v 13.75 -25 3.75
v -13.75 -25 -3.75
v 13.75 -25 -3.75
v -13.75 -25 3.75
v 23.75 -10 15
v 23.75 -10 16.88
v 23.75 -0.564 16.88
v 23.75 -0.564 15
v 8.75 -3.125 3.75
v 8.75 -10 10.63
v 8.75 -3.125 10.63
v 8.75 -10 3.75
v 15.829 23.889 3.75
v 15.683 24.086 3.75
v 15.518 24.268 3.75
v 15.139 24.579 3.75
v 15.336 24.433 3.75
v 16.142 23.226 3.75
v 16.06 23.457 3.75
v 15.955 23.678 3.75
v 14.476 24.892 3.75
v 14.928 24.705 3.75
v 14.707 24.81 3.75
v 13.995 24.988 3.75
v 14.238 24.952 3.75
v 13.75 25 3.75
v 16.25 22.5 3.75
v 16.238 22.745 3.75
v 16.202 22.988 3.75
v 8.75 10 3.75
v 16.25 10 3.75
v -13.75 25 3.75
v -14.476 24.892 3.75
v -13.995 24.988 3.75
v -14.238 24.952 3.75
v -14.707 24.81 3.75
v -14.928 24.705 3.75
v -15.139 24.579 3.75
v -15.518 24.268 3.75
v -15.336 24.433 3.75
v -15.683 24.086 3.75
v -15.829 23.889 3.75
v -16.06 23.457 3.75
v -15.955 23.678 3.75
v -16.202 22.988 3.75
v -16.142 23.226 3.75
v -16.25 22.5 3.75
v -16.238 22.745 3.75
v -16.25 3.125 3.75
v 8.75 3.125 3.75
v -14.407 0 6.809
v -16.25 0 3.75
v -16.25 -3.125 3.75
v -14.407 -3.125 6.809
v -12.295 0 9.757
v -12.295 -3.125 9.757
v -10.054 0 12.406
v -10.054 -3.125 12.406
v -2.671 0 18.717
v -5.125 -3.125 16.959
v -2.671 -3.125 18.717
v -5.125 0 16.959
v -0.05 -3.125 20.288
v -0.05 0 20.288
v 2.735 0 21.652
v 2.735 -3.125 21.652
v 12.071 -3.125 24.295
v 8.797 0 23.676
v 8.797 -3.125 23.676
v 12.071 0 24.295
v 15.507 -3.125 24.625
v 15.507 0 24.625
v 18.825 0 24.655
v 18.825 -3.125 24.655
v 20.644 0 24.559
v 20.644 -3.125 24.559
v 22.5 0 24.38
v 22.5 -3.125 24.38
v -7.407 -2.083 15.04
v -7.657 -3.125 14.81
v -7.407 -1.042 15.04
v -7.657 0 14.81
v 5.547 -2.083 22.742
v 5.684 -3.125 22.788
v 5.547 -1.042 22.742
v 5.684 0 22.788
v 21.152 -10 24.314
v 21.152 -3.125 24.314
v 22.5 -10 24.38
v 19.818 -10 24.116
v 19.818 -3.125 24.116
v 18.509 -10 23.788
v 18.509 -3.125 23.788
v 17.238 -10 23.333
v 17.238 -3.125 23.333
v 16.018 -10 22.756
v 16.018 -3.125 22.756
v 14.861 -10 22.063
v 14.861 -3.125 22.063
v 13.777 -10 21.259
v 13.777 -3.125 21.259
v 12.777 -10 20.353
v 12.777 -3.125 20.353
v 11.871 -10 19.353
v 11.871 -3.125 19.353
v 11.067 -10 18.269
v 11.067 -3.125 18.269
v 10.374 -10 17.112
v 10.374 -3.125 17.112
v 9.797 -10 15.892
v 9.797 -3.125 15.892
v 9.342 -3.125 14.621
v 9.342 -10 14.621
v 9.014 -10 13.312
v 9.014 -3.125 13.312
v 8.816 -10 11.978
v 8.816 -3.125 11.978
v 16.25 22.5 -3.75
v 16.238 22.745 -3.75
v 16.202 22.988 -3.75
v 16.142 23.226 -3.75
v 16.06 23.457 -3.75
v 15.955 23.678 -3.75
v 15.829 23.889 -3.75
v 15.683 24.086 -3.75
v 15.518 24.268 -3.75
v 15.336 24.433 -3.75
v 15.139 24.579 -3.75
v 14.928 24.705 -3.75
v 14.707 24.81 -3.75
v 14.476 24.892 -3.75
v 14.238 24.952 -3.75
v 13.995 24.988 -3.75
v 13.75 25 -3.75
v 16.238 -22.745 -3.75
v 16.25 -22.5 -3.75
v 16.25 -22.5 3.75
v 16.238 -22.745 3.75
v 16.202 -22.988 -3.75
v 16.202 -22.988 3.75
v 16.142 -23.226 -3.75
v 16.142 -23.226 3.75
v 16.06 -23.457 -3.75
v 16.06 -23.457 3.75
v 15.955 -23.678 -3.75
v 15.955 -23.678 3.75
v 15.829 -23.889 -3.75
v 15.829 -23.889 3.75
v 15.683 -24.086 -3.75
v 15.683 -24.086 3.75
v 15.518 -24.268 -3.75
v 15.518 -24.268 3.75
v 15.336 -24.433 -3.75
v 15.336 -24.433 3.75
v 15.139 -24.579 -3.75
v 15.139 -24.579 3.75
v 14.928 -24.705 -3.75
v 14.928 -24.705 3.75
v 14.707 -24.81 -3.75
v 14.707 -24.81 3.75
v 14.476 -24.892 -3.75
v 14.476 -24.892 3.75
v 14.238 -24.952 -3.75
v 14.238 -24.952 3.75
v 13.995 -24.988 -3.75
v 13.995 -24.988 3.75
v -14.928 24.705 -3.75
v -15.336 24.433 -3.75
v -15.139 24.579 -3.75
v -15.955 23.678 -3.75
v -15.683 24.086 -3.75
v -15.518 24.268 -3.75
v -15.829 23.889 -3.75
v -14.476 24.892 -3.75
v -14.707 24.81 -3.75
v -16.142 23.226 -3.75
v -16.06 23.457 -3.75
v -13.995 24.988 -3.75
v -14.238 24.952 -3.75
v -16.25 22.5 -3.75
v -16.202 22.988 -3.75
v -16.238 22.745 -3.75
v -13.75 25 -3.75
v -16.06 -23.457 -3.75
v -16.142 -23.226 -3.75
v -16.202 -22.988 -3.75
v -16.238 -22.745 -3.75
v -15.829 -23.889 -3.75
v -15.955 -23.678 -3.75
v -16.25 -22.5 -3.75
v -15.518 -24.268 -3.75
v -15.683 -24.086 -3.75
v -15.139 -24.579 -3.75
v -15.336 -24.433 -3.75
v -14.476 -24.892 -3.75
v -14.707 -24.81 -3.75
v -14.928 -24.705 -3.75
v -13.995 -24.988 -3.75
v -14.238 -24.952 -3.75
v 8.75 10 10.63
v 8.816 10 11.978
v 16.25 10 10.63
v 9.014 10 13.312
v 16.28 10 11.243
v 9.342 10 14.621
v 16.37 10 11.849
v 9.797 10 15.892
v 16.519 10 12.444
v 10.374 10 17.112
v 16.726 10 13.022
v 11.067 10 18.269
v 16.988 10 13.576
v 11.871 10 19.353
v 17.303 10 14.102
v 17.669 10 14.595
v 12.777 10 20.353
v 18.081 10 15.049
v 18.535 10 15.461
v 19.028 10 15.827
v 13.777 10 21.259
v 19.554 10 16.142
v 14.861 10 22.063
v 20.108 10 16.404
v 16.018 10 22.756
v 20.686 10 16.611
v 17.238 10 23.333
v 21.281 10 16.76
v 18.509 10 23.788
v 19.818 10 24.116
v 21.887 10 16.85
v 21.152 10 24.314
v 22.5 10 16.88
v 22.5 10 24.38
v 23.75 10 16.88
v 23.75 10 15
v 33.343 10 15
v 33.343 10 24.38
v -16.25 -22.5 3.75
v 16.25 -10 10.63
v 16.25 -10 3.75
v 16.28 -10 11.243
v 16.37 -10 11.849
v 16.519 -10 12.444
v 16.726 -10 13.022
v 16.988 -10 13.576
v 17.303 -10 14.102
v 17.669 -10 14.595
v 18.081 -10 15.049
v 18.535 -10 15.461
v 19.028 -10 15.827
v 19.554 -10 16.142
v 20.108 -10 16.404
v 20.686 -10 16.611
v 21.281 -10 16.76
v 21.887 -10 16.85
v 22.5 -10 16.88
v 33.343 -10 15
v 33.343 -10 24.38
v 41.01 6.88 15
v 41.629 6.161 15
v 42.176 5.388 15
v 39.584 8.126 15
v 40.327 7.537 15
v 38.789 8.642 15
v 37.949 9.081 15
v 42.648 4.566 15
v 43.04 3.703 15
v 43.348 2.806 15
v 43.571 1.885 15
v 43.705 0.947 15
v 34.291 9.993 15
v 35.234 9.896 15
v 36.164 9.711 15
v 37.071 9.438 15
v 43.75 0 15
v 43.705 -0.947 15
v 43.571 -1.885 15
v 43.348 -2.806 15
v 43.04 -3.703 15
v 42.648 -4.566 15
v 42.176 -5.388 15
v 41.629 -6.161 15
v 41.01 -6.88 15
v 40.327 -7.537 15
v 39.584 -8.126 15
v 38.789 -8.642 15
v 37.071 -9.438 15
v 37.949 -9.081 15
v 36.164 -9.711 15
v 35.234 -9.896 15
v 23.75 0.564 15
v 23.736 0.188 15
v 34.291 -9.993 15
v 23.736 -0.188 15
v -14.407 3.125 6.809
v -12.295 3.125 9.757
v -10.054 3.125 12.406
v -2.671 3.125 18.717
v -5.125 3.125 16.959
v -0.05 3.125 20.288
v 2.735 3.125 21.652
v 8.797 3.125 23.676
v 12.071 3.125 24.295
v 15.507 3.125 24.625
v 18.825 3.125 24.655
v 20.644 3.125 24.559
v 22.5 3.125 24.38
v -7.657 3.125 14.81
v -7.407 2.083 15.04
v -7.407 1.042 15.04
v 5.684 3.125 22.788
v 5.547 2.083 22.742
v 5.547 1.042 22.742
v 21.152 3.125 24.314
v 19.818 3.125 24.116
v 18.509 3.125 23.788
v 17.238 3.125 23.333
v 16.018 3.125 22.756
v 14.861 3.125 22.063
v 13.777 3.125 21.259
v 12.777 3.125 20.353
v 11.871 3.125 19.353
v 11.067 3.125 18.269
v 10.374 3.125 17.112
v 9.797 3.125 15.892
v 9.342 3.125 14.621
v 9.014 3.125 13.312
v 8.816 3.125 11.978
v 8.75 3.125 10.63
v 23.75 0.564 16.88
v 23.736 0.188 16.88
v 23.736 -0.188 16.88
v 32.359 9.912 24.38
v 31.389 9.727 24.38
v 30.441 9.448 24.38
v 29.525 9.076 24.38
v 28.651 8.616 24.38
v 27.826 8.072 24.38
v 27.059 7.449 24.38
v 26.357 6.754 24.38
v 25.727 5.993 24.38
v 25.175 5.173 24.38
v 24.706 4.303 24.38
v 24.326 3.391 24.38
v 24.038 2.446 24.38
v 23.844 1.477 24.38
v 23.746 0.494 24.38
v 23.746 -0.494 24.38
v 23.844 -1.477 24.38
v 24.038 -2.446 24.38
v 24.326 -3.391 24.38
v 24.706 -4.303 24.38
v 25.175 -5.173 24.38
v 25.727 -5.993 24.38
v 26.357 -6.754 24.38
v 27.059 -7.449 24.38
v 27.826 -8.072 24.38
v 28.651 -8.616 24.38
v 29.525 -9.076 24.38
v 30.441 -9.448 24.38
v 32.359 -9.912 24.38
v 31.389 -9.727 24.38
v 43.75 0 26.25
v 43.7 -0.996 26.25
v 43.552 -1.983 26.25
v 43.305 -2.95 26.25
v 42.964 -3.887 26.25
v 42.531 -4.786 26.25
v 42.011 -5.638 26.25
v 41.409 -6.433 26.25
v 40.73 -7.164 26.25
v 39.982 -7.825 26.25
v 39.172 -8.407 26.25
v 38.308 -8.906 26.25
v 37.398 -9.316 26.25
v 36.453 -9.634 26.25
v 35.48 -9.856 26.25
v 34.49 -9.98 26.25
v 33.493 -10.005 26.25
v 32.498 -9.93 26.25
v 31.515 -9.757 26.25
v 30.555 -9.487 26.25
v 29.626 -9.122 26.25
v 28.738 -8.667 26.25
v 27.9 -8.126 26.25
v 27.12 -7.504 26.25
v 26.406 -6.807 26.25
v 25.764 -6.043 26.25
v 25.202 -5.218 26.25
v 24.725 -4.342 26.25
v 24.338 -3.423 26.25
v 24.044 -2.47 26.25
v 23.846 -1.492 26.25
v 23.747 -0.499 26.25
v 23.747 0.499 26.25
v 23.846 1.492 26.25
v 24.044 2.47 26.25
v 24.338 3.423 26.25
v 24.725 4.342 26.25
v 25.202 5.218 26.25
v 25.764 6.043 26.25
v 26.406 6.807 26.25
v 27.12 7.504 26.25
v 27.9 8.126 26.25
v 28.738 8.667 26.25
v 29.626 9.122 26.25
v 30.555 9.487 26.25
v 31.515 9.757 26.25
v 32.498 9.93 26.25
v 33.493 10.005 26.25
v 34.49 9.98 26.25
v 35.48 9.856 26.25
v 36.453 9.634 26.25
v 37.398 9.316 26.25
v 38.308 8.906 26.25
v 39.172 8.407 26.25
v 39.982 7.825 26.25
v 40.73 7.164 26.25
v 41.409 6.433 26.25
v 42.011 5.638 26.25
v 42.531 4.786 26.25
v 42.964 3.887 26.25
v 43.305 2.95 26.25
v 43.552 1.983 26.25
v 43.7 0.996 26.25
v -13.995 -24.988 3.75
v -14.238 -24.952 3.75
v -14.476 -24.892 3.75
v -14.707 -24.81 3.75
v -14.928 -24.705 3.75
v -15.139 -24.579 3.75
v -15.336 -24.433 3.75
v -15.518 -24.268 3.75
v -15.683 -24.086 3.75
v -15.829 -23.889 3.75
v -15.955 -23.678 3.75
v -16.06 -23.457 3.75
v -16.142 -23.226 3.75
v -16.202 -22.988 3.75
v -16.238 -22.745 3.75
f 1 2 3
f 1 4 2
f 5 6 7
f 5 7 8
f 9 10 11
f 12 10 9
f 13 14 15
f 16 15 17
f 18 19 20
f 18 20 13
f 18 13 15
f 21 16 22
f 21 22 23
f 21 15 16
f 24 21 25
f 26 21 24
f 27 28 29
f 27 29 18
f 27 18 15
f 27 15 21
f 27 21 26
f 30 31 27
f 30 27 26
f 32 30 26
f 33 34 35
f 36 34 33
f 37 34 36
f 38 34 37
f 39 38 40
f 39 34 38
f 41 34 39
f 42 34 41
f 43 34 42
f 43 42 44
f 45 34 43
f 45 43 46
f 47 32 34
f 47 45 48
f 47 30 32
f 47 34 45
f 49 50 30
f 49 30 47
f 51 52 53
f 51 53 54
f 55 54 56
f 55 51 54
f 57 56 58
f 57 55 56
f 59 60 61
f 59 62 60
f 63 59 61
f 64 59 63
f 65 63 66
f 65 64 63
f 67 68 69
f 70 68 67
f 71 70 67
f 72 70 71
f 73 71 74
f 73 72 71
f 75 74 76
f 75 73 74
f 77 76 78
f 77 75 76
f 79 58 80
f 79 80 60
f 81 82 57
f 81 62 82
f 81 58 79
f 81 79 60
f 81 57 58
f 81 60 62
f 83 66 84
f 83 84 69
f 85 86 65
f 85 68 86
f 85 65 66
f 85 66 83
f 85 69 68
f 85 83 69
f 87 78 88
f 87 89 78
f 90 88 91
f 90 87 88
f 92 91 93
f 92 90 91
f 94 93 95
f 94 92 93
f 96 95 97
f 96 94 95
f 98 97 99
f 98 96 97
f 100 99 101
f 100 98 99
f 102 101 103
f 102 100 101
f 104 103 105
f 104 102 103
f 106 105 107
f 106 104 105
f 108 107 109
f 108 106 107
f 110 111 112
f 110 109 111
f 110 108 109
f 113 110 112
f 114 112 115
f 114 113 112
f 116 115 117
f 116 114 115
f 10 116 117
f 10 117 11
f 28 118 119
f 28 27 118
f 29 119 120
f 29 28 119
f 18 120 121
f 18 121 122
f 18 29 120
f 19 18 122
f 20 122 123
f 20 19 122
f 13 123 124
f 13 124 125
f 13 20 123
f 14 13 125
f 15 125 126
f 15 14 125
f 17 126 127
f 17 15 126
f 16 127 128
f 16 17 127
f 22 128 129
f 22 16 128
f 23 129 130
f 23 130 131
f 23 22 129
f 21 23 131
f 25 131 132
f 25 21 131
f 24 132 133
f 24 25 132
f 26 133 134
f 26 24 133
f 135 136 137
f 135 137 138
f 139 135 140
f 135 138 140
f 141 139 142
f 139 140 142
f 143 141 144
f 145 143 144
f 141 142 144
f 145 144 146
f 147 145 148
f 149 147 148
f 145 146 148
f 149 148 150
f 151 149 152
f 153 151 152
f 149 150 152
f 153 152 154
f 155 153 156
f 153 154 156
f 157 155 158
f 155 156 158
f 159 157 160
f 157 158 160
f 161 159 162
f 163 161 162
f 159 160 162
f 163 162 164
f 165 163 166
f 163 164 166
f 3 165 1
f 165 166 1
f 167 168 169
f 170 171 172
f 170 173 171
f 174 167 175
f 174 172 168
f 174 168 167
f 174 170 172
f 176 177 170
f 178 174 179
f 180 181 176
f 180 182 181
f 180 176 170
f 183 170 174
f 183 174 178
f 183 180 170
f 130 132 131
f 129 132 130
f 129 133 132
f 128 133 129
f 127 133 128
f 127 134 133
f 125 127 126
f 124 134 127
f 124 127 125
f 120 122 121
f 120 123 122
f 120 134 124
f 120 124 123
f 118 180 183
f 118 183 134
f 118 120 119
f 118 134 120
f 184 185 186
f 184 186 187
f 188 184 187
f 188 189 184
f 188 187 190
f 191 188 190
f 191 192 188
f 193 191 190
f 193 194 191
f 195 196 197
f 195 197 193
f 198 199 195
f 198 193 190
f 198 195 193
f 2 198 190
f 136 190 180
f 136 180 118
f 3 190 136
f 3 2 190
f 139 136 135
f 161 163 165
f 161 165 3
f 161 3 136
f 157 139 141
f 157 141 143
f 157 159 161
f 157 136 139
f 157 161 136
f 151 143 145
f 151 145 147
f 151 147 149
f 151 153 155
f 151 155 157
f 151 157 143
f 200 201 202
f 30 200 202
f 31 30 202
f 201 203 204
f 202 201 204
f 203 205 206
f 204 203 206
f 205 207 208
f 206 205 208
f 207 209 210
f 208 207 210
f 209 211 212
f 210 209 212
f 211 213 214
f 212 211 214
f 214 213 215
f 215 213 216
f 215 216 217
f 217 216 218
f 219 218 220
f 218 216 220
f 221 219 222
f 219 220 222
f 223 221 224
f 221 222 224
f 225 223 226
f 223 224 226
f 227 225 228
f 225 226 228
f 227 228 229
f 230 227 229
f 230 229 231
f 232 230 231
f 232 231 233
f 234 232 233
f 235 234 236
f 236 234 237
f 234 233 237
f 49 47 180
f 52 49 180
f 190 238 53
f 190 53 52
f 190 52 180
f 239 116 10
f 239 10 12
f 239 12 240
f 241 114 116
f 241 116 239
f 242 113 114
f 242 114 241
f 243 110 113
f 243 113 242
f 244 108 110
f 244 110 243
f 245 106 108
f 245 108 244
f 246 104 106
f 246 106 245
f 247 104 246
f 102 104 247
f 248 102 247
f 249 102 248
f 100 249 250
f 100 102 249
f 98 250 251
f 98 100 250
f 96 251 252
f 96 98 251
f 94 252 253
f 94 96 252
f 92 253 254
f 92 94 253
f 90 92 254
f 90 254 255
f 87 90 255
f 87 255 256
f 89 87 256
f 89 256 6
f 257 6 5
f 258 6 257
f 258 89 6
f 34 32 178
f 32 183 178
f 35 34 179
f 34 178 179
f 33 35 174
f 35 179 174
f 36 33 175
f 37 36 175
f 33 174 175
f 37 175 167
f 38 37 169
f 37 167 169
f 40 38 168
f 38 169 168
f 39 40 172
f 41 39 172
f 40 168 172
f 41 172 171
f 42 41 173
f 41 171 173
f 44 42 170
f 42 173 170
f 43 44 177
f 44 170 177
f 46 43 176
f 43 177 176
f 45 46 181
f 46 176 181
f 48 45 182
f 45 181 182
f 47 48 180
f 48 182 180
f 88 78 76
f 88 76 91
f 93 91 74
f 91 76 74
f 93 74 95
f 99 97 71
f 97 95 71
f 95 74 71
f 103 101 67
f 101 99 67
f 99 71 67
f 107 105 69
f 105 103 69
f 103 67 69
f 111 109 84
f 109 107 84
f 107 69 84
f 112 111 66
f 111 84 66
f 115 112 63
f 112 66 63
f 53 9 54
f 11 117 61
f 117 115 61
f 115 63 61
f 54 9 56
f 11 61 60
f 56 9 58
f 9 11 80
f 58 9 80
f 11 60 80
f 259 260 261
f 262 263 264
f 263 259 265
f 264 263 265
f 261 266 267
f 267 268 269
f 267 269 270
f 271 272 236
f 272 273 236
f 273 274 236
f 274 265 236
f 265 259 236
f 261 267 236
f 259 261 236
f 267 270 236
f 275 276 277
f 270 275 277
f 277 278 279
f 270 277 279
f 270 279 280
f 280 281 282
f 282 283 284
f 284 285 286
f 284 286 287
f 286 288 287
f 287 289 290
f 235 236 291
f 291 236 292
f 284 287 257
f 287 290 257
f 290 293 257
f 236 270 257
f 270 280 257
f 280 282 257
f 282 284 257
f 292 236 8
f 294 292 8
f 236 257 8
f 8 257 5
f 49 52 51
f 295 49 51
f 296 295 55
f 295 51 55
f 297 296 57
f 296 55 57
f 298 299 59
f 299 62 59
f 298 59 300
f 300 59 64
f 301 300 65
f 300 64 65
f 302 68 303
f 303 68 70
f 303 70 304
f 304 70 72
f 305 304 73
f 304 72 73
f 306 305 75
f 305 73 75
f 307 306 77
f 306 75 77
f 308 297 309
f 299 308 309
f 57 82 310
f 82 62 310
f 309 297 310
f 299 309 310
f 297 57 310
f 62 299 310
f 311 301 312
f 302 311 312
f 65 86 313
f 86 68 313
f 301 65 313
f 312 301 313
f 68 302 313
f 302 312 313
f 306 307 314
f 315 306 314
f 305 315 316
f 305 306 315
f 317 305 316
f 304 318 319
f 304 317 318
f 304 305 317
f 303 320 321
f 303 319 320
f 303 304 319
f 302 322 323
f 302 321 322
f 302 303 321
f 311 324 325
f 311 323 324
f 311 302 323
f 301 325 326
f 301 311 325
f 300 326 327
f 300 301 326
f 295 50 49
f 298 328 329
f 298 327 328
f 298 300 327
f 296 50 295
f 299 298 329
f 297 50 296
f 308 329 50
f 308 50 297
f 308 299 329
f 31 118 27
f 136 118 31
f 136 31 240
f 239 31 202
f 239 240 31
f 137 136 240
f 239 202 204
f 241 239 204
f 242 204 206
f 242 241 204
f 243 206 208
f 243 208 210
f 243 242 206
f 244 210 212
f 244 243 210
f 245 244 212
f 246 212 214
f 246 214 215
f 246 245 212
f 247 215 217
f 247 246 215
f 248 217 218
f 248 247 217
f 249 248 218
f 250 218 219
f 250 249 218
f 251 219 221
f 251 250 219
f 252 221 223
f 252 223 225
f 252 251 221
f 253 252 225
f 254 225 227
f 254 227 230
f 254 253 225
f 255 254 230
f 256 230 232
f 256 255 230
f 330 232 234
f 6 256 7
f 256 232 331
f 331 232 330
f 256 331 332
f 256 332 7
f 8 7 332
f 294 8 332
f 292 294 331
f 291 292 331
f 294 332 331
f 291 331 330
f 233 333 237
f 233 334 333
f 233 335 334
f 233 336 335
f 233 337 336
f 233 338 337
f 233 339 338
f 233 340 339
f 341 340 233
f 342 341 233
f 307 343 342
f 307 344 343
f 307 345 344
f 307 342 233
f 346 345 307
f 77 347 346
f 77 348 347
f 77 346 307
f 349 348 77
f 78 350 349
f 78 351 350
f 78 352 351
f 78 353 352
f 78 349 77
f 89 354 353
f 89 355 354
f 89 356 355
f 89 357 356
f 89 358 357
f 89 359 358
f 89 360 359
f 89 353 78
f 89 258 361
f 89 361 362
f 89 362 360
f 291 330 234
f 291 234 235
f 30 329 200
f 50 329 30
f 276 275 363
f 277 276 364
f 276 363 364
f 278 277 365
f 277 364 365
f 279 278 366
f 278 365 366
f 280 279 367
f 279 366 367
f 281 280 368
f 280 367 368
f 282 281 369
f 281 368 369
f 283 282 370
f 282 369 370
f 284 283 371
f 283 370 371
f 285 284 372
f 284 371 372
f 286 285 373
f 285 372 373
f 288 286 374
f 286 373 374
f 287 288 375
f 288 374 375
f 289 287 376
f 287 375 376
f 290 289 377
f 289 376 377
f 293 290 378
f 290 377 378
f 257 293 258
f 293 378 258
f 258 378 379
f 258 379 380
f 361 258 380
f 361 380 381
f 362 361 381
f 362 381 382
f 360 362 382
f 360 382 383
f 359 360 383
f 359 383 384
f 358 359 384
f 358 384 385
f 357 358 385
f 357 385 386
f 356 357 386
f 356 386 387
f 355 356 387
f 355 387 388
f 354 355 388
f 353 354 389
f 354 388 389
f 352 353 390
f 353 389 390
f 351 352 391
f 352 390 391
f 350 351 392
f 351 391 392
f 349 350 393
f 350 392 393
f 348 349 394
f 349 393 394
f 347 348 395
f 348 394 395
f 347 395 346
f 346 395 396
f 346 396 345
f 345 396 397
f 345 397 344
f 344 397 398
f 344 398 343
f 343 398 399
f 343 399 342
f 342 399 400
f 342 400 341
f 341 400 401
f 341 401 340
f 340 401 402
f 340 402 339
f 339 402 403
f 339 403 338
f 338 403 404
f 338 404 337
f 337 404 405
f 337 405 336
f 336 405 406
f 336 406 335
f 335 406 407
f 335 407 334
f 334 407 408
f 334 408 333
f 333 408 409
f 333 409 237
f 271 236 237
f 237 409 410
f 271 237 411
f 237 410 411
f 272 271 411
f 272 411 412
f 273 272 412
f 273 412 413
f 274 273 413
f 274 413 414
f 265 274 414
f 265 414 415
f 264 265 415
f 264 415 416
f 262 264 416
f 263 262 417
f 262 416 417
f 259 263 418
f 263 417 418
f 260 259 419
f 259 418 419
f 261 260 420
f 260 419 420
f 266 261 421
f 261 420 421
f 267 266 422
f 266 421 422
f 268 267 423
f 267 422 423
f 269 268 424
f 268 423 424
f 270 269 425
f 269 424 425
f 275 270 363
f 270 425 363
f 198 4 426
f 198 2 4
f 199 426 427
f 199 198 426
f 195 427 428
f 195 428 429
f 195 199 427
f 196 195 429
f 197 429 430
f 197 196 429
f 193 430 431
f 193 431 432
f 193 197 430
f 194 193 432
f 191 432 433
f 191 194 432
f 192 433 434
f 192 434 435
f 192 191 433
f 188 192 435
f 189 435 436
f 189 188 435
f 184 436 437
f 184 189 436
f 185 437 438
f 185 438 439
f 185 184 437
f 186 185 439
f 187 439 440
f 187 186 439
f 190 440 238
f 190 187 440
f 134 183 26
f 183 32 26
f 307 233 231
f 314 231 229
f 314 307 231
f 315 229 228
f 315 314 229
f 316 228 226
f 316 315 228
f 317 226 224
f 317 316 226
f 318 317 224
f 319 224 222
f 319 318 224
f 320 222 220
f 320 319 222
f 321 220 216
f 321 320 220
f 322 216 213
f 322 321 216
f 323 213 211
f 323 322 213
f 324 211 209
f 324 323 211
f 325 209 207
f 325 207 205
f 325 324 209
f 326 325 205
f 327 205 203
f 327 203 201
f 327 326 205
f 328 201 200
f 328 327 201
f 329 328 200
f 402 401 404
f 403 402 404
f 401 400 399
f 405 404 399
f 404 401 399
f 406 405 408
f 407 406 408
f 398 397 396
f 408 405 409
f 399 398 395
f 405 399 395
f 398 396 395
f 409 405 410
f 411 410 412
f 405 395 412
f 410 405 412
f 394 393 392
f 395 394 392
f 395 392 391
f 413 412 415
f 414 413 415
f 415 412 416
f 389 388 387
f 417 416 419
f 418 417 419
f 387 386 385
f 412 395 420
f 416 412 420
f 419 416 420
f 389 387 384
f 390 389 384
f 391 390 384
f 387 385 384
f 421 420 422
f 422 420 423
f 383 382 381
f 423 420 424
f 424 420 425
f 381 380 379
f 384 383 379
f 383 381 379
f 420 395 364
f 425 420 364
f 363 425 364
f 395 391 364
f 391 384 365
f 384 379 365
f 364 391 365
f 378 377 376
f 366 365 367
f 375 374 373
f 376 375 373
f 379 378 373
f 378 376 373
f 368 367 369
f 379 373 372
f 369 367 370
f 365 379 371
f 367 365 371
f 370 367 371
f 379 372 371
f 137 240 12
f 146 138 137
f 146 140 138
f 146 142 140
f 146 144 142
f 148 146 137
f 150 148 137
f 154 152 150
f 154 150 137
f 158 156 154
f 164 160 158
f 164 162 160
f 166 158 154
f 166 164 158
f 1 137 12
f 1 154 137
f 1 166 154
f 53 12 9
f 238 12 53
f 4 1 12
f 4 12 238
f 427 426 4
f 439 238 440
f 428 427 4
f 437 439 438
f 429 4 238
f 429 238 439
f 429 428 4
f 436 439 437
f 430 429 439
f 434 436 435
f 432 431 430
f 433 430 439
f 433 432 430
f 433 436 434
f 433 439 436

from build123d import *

# Parameters (mm, degrees)
F1_DEPTH = 25
F2_DEPTH = 10
F3_DEPTH = 3.125
F5_R     = 2.5


with BuildPart() as f1:
    # F0 (on Front) → F1 (new body, symmetric)
    with BuildSketch(Plane.XZ):
        Polygon((8.75, 3.75), (-16.25, 3.75), (-16.25, -3.75), (16.25, -3.75), (16.25, 3.75), align=None)
    extrude(amount=F1_DEPTH, both=True)

    # F0 (on Front) → F2 (join, symmetric)
    with BuildSketch(Plane.XZ):
        with BuildLine():
            Line((8.75, 10.63), (8.75, 3.75))
            Line((8.75, 3.75), (16.25, 3.75))
            Line((16.25, 3.75), (16.25, 10.63))
            ThreePointArc((16.25, 10.63), (18.080583, 15.049417), (22.5, 16.88))
            Line((22.5, 16.88), (23.75, 16.88))
            Line((23.75, 16.88), (23.75, 24.38))
            Line((23.75, 24.38), (22.5, 24.38))
            ThreePointArc((22.5, 24.38), (12.777282, 20.352718), (8.75, 10.63))
        make_face()
        Polygon((33.742055, 24.38), (23.75, 24.38), (23.75, 16.88), (23.75, 15), (33.742055, 15), align=None)
    extrude(amount=F2_DEPTH, both=True)

    # F0 (on Front) → F3 (join, symmetric)
    with BuildSketch(Plane.XZ):
        with BuildLine():
            add(Edge.make_bspline(
                [(-16.25, 3.75), (-9.499033, 16.007805), (3.585062, 26.59969), (22.5, 24.38)],
                knots=[0, 0, 0, 0, 43.899424, 43.899424, 43.899424, 43.899424], degree=3))
            Line((-16.25, 3.75), (8.75, 3.75))
            Line((8.75, 3.75), (8.75, 10.63))
            ThreePointArc((8.75, 10.63), (12.777282, 20.352718), (22.5, 24.38))
        make_face()
    extrude(amount=F3_DEPTH, both=True)

    # F0 (on Front) → F4 (revolve)
    with BuildSketch(Plane.XZ):
        Polygon((33.742055, 26.25), (33.742055, 24.38), (33.742055, 15), (43.75, 15), (43.75, 26.25), align=None)
    revolve(axis=Axis((33.742055, 0, 20.625), (0, 0, -1)))

    # F5
    f5_edges = [f1.edges().sort_by_distance(p)[0] for p in [
        (16.25, 25, 0),
        (-16.25, 25, 0),
        (-16.25, -25, 0),
        (16.25, -25, 0),
    ]]
    fillet(f5_edges, radius=F5_R)


solid = f1.part
